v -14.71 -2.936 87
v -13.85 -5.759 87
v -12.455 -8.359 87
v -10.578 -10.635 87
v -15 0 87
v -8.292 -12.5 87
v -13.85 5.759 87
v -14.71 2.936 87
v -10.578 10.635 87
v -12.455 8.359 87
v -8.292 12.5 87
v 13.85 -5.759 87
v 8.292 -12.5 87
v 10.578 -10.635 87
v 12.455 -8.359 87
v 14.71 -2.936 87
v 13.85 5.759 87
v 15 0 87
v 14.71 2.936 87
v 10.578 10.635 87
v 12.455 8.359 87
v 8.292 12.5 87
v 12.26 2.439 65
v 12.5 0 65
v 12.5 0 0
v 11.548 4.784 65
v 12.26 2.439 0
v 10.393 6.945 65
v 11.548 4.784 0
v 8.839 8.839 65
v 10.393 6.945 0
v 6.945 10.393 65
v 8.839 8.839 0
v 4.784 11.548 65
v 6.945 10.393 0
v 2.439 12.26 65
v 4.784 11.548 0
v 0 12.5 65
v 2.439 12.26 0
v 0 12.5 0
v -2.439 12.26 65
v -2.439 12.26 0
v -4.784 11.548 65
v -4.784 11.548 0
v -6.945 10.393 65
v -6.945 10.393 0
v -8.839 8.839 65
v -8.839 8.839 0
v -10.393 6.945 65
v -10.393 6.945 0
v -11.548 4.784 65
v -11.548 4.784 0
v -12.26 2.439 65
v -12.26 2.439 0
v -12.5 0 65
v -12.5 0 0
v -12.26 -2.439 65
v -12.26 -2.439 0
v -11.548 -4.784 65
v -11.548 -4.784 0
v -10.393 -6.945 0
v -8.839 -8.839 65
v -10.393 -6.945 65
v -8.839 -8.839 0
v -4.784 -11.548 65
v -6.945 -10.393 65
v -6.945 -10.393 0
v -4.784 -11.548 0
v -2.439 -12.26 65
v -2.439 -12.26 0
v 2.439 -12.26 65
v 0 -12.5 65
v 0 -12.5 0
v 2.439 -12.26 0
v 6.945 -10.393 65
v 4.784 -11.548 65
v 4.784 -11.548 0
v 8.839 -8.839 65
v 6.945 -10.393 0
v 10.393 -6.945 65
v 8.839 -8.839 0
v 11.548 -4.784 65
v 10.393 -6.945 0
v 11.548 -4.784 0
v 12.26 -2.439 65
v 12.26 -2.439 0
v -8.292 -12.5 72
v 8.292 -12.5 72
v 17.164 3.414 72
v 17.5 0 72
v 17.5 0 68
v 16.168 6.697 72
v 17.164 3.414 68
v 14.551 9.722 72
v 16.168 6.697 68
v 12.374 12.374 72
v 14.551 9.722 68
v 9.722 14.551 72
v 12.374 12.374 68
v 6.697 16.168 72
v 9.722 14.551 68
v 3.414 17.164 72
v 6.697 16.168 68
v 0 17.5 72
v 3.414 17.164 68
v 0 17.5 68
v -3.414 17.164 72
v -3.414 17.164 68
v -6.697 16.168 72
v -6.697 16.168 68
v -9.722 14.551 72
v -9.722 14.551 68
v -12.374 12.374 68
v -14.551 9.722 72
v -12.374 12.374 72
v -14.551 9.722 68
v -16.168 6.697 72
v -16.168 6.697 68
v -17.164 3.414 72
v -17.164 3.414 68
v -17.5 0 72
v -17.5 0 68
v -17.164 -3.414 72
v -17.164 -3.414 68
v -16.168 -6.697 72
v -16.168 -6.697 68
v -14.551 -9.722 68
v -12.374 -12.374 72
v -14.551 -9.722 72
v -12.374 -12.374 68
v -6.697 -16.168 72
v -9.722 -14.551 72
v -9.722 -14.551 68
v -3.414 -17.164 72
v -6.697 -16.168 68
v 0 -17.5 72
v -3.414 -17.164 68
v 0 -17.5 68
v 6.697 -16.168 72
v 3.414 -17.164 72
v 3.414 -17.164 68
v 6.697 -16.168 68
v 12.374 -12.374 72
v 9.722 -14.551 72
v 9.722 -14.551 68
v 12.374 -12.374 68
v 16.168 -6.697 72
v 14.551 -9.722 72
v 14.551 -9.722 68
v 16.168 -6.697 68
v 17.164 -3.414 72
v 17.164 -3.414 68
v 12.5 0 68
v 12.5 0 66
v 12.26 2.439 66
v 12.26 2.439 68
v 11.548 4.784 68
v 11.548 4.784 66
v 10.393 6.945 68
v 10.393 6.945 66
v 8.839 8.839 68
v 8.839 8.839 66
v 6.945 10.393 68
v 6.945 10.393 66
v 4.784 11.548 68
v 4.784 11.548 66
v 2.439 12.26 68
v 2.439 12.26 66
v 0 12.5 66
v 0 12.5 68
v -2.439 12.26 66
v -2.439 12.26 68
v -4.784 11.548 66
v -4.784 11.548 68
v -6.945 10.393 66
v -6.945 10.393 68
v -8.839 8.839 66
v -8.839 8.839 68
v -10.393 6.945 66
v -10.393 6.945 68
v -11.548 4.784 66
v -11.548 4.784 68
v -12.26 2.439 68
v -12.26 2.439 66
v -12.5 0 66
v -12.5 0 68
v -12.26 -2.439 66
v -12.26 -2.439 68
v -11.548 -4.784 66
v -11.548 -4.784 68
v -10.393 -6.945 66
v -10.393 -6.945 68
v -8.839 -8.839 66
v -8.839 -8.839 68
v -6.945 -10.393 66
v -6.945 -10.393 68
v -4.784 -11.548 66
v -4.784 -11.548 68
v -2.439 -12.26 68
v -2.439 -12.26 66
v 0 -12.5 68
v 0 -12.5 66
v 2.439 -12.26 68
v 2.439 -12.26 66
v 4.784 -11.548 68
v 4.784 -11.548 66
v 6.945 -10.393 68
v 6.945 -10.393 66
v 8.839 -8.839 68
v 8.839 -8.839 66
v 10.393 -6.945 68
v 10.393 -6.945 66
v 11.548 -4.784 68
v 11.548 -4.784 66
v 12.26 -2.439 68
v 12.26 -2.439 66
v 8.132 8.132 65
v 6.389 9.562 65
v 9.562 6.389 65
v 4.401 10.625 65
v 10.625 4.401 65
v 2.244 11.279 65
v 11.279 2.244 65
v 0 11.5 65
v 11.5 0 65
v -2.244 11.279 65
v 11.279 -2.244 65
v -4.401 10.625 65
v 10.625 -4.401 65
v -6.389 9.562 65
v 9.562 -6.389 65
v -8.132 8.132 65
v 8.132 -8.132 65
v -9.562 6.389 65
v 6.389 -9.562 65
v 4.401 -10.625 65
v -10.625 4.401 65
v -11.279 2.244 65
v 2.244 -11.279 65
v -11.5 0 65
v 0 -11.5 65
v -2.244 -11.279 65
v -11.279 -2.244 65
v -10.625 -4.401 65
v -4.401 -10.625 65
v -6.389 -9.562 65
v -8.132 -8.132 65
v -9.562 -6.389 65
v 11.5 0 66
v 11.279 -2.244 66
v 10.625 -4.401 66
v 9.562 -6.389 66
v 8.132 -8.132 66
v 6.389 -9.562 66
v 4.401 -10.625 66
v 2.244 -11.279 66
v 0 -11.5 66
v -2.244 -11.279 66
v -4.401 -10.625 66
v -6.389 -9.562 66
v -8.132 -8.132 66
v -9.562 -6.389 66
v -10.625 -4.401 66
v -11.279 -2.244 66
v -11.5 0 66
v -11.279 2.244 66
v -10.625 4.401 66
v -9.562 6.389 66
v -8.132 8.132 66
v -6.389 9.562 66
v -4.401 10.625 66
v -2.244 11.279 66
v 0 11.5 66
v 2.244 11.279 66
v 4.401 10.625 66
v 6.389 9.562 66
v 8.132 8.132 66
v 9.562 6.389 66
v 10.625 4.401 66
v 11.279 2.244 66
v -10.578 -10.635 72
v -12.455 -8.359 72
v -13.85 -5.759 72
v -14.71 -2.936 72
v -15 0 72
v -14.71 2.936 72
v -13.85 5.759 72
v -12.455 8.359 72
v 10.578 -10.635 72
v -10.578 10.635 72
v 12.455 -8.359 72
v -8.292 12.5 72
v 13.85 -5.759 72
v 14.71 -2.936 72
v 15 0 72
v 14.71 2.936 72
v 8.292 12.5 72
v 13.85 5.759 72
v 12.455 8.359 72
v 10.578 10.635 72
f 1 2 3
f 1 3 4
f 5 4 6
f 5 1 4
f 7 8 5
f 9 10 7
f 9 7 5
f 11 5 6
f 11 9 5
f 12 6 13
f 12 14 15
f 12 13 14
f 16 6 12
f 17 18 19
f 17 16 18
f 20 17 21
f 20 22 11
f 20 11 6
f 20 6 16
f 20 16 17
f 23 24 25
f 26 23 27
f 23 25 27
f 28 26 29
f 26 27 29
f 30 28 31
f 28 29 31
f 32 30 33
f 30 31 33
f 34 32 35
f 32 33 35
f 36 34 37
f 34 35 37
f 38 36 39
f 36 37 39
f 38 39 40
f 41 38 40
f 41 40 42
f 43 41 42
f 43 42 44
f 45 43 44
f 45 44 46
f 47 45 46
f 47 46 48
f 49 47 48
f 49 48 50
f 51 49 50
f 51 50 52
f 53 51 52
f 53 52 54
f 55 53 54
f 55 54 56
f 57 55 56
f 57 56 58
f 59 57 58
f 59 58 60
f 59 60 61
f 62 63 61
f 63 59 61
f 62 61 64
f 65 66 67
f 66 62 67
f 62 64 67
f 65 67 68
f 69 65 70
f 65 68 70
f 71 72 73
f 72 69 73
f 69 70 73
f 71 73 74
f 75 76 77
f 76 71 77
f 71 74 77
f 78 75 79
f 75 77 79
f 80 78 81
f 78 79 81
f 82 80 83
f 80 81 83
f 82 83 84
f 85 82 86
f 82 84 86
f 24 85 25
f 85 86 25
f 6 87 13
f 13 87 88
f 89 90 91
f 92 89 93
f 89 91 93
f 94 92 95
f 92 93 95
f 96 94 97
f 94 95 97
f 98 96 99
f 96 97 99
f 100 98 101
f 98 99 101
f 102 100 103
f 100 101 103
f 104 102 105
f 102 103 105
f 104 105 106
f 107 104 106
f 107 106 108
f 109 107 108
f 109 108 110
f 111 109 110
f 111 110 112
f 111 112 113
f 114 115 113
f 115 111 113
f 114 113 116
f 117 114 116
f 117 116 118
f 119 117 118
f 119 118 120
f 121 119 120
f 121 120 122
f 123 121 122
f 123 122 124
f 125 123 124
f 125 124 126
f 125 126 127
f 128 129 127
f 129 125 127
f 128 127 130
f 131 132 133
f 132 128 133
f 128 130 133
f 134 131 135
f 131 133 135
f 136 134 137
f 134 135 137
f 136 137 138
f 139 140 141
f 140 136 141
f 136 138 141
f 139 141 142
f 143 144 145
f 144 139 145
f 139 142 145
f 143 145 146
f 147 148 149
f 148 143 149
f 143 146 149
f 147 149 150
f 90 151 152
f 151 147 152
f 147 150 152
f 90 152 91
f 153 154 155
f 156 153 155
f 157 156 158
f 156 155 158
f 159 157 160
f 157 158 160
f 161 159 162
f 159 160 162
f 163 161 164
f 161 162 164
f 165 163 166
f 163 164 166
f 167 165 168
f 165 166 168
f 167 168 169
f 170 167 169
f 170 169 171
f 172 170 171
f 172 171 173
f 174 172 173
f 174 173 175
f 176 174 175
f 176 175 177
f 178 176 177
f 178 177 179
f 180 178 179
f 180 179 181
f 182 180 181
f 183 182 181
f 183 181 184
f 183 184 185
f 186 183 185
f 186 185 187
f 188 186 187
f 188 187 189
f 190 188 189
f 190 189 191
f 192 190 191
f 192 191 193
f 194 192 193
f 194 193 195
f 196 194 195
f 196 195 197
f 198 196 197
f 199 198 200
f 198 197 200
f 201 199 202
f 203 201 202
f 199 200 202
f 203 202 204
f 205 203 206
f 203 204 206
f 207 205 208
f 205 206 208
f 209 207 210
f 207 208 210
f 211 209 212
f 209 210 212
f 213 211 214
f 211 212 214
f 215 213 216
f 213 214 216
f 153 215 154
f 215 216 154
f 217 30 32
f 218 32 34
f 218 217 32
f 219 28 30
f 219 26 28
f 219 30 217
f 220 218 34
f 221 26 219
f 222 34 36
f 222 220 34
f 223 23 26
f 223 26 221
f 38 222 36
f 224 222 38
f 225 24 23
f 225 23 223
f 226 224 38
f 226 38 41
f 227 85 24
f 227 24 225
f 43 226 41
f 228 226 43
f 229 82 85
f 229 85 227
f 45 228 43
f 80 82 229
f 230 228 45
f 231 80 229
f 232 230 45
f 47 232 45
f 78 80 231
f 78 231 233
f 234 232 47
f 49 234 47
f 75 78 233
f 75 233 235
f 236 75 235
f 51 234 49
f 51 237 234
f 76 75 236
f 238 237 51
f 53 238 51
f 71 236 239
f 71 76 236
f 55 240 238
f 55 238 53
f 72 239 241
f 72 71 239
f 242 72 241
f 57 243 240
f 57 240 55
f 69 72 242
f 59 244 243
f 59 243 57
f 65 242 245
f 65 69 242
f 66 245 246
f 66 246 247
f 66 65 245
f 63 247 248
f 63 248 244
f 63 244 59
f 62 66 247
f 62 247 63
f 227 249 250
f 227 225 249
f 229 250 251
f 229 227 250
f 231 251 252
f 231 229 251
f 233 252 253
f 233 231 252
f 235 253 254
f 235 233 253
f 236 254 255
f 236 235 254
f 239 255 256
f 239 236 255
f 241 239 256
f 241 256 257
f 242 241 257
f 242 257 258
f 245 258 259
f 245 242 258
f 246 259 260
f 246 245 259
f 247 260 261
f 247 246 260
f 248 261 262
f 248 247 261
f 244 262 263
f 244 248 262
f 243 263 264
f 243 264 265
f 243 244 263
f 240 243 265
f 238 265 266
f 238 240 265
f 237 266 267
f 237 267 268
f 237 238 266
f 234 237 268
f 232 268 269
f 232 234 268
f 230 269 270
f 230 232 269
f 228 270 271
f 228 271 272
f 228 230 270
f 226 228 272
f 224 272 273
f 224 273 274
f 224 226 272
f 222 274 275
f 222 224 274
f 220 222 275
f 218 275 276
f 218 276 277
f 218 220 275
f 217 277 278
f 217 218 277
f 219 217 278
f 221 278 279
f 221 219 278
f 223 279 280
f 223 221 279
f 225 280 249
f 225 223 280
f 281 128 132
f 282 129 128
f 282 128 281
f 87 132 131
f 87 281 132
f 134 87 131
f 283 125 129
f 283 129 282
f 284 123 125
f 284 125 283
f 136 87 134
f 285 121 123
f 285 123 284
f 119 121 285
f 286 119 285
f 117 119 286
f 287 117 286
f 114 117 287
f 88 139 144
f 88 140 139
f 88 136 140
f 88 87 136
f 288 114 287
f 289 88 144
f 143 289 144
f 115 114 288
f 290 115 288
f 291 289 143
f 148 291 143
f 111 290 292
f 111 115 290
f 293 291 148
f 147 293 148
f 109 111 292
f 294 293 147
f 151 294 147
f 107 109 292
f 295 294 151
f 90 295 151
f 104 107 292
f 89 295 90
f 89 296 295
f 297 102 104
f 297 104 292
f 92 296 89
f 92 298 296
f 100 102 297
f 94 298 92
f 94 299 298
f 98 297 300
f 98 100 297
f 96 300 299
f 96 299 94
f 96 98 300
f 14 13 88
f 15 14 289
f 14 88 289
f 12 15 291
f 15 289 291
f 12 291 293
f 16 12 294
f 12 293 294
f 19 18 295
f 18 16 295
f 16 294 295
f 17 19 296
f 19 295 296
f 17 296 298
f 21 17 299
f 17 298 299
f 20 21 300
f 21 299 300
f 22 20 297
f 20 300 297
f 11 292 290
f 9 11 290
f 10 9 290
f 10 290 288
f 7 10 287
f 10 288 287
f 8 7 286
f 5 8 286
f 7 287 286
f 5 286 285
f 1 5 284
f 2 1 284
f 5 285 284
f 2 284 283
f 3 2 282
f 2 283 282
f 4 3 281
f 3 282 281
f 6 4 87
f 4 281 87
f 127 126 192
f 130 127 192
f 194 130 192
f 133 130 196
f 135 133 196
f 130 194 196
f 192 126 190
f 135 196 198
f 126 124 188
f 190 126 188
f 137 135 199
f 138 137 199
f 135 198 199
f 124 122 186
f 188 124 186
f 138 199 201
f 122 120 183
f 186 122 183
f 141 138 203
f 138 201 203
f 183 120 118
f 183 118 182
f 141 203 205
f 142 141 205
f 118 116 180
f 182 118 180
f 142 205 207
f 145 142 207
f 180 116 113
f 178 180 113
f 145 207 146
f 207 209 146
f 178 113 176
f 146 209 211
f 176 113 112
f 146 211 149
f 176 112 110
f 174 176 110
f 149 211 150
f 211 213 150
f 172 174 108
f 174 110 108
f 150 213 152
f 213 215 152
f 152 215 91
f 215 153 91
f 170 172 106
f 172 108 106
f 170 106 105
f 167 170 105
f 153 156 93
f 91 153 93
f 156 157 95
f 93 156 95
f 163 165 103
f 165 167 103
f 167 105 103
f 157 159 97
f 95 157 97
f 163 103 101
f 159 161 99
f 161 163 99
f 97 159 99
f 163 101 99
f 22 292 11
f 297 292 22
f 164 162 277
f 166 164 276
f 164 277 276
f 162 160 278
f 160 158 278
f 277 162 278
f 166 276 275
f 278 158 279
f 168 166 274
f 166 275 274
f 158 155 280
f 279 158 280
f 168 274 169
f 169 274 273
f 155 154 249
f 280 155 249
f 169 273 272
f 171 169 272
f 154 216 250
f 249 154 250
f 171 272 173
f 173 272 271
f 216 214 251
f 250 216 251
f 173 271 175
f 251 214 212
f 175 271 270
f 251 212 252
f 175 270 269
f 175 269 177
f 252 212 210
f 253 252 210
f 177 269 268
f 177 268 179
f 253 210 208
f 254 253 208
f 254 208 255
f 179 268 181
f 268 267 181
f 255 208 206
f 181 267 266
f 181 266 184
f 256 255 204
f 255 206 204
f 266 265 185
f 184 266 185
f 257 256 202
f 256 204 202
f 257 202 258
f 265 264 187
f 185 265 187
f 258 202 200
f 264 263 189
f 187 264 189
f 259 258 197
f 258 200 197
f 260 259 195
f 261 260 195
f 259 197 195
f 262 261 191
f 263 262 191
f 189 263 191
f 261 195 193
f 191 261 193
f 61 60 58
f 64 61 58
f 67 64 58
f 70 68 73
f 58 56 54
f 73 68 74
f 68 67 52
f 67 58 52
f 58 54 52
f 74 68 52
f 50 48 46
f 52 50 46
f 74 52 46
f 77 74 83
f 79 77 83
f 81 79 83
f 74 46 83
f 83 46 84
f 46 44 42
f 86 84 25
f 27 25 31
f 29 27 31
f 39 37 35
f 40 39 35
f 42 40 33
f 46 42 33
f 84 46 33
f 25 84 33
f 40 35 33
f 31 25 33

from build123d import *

# Parameters (mm, degrees)
SKETCH1_R                  = 12.5
SHAFT_D25X68_DEPTH         = 68
SKETCH2_R                  = 17.5
COLLAR_D35X4_DEPTH         = 4
SKETCH3_R                  = 15
GEARD_SEAT_D30X15_DEPTH    = 15
SKETCH4_W                  = 32
SKETCH4_H                  = 3.5
DOUBLE_FLAT_CUT_25MM_DEPTH = 15
SKETCH5_W                  = 1
SKETCH5_H                  = 2


with BuildPart() as part:
    # Sketch1 → Shaft_D25x68 (new body)
    with BuildSketch(Plane.XY):
        Circle(SKETCH1_R)
    extrude(amount=SHAFT_D25X68_DEPTH)

    # Sketch2 → Collar_D35x4 (add)
    with BuildSketch(Plane.XY.offset(68)):
        Circle(SKETCH2_R)
    extrude(amount=COLLAR_D35X4_DEPTH)

    # Sketch3 → GearD_Seat_D30x15 (add)
    with BuildSketch(Plane.XY.offset(72)):
        Circle(SKETCH3_R)
    extrude(amount=GEARD_SEAT_D30X15_DEPTH)

    # Sketch4 → Double_Flat_Cut_25mm (cut)
    with BuildSketch(Plane.XY.offset(72)):
        with Locations((0, 14.25)):
            Rectangle(SKETCH4_W, SKETCH4_H)
        with Locations((0, -14.25)):
            Rectangle(SKETCH4_W, SKETCH4_H)
    extrude(amount=DOUBLE_FLAT_CUT_25MM_DEPTH, mode=Mode.SUBTRACT)

    # Sketch5 → SnapRing_Groove_D23x1 (revolve, cut)
    with BuildSketch(Plane(origin=(0, 0, 0), x_dir=(0, 0, -1), z_dir=(1, 0, 0)), mode=Mode.PRIVATE) as snapring_groove_d23x1_sk:
        with Locations((-65.5, 12.5)):
            Rectangle(SKETCH5_W, SKETCH5_H)
    revolve(snapring_groove_d23x1_sk.sketch.rotate(Axis((0, 0, 90), (0, 0, -1)), 90), axis=Axis((0, 0, 90), (0, 0, -1)), mode=Mode.SUBTRACT)


solid = part.part
